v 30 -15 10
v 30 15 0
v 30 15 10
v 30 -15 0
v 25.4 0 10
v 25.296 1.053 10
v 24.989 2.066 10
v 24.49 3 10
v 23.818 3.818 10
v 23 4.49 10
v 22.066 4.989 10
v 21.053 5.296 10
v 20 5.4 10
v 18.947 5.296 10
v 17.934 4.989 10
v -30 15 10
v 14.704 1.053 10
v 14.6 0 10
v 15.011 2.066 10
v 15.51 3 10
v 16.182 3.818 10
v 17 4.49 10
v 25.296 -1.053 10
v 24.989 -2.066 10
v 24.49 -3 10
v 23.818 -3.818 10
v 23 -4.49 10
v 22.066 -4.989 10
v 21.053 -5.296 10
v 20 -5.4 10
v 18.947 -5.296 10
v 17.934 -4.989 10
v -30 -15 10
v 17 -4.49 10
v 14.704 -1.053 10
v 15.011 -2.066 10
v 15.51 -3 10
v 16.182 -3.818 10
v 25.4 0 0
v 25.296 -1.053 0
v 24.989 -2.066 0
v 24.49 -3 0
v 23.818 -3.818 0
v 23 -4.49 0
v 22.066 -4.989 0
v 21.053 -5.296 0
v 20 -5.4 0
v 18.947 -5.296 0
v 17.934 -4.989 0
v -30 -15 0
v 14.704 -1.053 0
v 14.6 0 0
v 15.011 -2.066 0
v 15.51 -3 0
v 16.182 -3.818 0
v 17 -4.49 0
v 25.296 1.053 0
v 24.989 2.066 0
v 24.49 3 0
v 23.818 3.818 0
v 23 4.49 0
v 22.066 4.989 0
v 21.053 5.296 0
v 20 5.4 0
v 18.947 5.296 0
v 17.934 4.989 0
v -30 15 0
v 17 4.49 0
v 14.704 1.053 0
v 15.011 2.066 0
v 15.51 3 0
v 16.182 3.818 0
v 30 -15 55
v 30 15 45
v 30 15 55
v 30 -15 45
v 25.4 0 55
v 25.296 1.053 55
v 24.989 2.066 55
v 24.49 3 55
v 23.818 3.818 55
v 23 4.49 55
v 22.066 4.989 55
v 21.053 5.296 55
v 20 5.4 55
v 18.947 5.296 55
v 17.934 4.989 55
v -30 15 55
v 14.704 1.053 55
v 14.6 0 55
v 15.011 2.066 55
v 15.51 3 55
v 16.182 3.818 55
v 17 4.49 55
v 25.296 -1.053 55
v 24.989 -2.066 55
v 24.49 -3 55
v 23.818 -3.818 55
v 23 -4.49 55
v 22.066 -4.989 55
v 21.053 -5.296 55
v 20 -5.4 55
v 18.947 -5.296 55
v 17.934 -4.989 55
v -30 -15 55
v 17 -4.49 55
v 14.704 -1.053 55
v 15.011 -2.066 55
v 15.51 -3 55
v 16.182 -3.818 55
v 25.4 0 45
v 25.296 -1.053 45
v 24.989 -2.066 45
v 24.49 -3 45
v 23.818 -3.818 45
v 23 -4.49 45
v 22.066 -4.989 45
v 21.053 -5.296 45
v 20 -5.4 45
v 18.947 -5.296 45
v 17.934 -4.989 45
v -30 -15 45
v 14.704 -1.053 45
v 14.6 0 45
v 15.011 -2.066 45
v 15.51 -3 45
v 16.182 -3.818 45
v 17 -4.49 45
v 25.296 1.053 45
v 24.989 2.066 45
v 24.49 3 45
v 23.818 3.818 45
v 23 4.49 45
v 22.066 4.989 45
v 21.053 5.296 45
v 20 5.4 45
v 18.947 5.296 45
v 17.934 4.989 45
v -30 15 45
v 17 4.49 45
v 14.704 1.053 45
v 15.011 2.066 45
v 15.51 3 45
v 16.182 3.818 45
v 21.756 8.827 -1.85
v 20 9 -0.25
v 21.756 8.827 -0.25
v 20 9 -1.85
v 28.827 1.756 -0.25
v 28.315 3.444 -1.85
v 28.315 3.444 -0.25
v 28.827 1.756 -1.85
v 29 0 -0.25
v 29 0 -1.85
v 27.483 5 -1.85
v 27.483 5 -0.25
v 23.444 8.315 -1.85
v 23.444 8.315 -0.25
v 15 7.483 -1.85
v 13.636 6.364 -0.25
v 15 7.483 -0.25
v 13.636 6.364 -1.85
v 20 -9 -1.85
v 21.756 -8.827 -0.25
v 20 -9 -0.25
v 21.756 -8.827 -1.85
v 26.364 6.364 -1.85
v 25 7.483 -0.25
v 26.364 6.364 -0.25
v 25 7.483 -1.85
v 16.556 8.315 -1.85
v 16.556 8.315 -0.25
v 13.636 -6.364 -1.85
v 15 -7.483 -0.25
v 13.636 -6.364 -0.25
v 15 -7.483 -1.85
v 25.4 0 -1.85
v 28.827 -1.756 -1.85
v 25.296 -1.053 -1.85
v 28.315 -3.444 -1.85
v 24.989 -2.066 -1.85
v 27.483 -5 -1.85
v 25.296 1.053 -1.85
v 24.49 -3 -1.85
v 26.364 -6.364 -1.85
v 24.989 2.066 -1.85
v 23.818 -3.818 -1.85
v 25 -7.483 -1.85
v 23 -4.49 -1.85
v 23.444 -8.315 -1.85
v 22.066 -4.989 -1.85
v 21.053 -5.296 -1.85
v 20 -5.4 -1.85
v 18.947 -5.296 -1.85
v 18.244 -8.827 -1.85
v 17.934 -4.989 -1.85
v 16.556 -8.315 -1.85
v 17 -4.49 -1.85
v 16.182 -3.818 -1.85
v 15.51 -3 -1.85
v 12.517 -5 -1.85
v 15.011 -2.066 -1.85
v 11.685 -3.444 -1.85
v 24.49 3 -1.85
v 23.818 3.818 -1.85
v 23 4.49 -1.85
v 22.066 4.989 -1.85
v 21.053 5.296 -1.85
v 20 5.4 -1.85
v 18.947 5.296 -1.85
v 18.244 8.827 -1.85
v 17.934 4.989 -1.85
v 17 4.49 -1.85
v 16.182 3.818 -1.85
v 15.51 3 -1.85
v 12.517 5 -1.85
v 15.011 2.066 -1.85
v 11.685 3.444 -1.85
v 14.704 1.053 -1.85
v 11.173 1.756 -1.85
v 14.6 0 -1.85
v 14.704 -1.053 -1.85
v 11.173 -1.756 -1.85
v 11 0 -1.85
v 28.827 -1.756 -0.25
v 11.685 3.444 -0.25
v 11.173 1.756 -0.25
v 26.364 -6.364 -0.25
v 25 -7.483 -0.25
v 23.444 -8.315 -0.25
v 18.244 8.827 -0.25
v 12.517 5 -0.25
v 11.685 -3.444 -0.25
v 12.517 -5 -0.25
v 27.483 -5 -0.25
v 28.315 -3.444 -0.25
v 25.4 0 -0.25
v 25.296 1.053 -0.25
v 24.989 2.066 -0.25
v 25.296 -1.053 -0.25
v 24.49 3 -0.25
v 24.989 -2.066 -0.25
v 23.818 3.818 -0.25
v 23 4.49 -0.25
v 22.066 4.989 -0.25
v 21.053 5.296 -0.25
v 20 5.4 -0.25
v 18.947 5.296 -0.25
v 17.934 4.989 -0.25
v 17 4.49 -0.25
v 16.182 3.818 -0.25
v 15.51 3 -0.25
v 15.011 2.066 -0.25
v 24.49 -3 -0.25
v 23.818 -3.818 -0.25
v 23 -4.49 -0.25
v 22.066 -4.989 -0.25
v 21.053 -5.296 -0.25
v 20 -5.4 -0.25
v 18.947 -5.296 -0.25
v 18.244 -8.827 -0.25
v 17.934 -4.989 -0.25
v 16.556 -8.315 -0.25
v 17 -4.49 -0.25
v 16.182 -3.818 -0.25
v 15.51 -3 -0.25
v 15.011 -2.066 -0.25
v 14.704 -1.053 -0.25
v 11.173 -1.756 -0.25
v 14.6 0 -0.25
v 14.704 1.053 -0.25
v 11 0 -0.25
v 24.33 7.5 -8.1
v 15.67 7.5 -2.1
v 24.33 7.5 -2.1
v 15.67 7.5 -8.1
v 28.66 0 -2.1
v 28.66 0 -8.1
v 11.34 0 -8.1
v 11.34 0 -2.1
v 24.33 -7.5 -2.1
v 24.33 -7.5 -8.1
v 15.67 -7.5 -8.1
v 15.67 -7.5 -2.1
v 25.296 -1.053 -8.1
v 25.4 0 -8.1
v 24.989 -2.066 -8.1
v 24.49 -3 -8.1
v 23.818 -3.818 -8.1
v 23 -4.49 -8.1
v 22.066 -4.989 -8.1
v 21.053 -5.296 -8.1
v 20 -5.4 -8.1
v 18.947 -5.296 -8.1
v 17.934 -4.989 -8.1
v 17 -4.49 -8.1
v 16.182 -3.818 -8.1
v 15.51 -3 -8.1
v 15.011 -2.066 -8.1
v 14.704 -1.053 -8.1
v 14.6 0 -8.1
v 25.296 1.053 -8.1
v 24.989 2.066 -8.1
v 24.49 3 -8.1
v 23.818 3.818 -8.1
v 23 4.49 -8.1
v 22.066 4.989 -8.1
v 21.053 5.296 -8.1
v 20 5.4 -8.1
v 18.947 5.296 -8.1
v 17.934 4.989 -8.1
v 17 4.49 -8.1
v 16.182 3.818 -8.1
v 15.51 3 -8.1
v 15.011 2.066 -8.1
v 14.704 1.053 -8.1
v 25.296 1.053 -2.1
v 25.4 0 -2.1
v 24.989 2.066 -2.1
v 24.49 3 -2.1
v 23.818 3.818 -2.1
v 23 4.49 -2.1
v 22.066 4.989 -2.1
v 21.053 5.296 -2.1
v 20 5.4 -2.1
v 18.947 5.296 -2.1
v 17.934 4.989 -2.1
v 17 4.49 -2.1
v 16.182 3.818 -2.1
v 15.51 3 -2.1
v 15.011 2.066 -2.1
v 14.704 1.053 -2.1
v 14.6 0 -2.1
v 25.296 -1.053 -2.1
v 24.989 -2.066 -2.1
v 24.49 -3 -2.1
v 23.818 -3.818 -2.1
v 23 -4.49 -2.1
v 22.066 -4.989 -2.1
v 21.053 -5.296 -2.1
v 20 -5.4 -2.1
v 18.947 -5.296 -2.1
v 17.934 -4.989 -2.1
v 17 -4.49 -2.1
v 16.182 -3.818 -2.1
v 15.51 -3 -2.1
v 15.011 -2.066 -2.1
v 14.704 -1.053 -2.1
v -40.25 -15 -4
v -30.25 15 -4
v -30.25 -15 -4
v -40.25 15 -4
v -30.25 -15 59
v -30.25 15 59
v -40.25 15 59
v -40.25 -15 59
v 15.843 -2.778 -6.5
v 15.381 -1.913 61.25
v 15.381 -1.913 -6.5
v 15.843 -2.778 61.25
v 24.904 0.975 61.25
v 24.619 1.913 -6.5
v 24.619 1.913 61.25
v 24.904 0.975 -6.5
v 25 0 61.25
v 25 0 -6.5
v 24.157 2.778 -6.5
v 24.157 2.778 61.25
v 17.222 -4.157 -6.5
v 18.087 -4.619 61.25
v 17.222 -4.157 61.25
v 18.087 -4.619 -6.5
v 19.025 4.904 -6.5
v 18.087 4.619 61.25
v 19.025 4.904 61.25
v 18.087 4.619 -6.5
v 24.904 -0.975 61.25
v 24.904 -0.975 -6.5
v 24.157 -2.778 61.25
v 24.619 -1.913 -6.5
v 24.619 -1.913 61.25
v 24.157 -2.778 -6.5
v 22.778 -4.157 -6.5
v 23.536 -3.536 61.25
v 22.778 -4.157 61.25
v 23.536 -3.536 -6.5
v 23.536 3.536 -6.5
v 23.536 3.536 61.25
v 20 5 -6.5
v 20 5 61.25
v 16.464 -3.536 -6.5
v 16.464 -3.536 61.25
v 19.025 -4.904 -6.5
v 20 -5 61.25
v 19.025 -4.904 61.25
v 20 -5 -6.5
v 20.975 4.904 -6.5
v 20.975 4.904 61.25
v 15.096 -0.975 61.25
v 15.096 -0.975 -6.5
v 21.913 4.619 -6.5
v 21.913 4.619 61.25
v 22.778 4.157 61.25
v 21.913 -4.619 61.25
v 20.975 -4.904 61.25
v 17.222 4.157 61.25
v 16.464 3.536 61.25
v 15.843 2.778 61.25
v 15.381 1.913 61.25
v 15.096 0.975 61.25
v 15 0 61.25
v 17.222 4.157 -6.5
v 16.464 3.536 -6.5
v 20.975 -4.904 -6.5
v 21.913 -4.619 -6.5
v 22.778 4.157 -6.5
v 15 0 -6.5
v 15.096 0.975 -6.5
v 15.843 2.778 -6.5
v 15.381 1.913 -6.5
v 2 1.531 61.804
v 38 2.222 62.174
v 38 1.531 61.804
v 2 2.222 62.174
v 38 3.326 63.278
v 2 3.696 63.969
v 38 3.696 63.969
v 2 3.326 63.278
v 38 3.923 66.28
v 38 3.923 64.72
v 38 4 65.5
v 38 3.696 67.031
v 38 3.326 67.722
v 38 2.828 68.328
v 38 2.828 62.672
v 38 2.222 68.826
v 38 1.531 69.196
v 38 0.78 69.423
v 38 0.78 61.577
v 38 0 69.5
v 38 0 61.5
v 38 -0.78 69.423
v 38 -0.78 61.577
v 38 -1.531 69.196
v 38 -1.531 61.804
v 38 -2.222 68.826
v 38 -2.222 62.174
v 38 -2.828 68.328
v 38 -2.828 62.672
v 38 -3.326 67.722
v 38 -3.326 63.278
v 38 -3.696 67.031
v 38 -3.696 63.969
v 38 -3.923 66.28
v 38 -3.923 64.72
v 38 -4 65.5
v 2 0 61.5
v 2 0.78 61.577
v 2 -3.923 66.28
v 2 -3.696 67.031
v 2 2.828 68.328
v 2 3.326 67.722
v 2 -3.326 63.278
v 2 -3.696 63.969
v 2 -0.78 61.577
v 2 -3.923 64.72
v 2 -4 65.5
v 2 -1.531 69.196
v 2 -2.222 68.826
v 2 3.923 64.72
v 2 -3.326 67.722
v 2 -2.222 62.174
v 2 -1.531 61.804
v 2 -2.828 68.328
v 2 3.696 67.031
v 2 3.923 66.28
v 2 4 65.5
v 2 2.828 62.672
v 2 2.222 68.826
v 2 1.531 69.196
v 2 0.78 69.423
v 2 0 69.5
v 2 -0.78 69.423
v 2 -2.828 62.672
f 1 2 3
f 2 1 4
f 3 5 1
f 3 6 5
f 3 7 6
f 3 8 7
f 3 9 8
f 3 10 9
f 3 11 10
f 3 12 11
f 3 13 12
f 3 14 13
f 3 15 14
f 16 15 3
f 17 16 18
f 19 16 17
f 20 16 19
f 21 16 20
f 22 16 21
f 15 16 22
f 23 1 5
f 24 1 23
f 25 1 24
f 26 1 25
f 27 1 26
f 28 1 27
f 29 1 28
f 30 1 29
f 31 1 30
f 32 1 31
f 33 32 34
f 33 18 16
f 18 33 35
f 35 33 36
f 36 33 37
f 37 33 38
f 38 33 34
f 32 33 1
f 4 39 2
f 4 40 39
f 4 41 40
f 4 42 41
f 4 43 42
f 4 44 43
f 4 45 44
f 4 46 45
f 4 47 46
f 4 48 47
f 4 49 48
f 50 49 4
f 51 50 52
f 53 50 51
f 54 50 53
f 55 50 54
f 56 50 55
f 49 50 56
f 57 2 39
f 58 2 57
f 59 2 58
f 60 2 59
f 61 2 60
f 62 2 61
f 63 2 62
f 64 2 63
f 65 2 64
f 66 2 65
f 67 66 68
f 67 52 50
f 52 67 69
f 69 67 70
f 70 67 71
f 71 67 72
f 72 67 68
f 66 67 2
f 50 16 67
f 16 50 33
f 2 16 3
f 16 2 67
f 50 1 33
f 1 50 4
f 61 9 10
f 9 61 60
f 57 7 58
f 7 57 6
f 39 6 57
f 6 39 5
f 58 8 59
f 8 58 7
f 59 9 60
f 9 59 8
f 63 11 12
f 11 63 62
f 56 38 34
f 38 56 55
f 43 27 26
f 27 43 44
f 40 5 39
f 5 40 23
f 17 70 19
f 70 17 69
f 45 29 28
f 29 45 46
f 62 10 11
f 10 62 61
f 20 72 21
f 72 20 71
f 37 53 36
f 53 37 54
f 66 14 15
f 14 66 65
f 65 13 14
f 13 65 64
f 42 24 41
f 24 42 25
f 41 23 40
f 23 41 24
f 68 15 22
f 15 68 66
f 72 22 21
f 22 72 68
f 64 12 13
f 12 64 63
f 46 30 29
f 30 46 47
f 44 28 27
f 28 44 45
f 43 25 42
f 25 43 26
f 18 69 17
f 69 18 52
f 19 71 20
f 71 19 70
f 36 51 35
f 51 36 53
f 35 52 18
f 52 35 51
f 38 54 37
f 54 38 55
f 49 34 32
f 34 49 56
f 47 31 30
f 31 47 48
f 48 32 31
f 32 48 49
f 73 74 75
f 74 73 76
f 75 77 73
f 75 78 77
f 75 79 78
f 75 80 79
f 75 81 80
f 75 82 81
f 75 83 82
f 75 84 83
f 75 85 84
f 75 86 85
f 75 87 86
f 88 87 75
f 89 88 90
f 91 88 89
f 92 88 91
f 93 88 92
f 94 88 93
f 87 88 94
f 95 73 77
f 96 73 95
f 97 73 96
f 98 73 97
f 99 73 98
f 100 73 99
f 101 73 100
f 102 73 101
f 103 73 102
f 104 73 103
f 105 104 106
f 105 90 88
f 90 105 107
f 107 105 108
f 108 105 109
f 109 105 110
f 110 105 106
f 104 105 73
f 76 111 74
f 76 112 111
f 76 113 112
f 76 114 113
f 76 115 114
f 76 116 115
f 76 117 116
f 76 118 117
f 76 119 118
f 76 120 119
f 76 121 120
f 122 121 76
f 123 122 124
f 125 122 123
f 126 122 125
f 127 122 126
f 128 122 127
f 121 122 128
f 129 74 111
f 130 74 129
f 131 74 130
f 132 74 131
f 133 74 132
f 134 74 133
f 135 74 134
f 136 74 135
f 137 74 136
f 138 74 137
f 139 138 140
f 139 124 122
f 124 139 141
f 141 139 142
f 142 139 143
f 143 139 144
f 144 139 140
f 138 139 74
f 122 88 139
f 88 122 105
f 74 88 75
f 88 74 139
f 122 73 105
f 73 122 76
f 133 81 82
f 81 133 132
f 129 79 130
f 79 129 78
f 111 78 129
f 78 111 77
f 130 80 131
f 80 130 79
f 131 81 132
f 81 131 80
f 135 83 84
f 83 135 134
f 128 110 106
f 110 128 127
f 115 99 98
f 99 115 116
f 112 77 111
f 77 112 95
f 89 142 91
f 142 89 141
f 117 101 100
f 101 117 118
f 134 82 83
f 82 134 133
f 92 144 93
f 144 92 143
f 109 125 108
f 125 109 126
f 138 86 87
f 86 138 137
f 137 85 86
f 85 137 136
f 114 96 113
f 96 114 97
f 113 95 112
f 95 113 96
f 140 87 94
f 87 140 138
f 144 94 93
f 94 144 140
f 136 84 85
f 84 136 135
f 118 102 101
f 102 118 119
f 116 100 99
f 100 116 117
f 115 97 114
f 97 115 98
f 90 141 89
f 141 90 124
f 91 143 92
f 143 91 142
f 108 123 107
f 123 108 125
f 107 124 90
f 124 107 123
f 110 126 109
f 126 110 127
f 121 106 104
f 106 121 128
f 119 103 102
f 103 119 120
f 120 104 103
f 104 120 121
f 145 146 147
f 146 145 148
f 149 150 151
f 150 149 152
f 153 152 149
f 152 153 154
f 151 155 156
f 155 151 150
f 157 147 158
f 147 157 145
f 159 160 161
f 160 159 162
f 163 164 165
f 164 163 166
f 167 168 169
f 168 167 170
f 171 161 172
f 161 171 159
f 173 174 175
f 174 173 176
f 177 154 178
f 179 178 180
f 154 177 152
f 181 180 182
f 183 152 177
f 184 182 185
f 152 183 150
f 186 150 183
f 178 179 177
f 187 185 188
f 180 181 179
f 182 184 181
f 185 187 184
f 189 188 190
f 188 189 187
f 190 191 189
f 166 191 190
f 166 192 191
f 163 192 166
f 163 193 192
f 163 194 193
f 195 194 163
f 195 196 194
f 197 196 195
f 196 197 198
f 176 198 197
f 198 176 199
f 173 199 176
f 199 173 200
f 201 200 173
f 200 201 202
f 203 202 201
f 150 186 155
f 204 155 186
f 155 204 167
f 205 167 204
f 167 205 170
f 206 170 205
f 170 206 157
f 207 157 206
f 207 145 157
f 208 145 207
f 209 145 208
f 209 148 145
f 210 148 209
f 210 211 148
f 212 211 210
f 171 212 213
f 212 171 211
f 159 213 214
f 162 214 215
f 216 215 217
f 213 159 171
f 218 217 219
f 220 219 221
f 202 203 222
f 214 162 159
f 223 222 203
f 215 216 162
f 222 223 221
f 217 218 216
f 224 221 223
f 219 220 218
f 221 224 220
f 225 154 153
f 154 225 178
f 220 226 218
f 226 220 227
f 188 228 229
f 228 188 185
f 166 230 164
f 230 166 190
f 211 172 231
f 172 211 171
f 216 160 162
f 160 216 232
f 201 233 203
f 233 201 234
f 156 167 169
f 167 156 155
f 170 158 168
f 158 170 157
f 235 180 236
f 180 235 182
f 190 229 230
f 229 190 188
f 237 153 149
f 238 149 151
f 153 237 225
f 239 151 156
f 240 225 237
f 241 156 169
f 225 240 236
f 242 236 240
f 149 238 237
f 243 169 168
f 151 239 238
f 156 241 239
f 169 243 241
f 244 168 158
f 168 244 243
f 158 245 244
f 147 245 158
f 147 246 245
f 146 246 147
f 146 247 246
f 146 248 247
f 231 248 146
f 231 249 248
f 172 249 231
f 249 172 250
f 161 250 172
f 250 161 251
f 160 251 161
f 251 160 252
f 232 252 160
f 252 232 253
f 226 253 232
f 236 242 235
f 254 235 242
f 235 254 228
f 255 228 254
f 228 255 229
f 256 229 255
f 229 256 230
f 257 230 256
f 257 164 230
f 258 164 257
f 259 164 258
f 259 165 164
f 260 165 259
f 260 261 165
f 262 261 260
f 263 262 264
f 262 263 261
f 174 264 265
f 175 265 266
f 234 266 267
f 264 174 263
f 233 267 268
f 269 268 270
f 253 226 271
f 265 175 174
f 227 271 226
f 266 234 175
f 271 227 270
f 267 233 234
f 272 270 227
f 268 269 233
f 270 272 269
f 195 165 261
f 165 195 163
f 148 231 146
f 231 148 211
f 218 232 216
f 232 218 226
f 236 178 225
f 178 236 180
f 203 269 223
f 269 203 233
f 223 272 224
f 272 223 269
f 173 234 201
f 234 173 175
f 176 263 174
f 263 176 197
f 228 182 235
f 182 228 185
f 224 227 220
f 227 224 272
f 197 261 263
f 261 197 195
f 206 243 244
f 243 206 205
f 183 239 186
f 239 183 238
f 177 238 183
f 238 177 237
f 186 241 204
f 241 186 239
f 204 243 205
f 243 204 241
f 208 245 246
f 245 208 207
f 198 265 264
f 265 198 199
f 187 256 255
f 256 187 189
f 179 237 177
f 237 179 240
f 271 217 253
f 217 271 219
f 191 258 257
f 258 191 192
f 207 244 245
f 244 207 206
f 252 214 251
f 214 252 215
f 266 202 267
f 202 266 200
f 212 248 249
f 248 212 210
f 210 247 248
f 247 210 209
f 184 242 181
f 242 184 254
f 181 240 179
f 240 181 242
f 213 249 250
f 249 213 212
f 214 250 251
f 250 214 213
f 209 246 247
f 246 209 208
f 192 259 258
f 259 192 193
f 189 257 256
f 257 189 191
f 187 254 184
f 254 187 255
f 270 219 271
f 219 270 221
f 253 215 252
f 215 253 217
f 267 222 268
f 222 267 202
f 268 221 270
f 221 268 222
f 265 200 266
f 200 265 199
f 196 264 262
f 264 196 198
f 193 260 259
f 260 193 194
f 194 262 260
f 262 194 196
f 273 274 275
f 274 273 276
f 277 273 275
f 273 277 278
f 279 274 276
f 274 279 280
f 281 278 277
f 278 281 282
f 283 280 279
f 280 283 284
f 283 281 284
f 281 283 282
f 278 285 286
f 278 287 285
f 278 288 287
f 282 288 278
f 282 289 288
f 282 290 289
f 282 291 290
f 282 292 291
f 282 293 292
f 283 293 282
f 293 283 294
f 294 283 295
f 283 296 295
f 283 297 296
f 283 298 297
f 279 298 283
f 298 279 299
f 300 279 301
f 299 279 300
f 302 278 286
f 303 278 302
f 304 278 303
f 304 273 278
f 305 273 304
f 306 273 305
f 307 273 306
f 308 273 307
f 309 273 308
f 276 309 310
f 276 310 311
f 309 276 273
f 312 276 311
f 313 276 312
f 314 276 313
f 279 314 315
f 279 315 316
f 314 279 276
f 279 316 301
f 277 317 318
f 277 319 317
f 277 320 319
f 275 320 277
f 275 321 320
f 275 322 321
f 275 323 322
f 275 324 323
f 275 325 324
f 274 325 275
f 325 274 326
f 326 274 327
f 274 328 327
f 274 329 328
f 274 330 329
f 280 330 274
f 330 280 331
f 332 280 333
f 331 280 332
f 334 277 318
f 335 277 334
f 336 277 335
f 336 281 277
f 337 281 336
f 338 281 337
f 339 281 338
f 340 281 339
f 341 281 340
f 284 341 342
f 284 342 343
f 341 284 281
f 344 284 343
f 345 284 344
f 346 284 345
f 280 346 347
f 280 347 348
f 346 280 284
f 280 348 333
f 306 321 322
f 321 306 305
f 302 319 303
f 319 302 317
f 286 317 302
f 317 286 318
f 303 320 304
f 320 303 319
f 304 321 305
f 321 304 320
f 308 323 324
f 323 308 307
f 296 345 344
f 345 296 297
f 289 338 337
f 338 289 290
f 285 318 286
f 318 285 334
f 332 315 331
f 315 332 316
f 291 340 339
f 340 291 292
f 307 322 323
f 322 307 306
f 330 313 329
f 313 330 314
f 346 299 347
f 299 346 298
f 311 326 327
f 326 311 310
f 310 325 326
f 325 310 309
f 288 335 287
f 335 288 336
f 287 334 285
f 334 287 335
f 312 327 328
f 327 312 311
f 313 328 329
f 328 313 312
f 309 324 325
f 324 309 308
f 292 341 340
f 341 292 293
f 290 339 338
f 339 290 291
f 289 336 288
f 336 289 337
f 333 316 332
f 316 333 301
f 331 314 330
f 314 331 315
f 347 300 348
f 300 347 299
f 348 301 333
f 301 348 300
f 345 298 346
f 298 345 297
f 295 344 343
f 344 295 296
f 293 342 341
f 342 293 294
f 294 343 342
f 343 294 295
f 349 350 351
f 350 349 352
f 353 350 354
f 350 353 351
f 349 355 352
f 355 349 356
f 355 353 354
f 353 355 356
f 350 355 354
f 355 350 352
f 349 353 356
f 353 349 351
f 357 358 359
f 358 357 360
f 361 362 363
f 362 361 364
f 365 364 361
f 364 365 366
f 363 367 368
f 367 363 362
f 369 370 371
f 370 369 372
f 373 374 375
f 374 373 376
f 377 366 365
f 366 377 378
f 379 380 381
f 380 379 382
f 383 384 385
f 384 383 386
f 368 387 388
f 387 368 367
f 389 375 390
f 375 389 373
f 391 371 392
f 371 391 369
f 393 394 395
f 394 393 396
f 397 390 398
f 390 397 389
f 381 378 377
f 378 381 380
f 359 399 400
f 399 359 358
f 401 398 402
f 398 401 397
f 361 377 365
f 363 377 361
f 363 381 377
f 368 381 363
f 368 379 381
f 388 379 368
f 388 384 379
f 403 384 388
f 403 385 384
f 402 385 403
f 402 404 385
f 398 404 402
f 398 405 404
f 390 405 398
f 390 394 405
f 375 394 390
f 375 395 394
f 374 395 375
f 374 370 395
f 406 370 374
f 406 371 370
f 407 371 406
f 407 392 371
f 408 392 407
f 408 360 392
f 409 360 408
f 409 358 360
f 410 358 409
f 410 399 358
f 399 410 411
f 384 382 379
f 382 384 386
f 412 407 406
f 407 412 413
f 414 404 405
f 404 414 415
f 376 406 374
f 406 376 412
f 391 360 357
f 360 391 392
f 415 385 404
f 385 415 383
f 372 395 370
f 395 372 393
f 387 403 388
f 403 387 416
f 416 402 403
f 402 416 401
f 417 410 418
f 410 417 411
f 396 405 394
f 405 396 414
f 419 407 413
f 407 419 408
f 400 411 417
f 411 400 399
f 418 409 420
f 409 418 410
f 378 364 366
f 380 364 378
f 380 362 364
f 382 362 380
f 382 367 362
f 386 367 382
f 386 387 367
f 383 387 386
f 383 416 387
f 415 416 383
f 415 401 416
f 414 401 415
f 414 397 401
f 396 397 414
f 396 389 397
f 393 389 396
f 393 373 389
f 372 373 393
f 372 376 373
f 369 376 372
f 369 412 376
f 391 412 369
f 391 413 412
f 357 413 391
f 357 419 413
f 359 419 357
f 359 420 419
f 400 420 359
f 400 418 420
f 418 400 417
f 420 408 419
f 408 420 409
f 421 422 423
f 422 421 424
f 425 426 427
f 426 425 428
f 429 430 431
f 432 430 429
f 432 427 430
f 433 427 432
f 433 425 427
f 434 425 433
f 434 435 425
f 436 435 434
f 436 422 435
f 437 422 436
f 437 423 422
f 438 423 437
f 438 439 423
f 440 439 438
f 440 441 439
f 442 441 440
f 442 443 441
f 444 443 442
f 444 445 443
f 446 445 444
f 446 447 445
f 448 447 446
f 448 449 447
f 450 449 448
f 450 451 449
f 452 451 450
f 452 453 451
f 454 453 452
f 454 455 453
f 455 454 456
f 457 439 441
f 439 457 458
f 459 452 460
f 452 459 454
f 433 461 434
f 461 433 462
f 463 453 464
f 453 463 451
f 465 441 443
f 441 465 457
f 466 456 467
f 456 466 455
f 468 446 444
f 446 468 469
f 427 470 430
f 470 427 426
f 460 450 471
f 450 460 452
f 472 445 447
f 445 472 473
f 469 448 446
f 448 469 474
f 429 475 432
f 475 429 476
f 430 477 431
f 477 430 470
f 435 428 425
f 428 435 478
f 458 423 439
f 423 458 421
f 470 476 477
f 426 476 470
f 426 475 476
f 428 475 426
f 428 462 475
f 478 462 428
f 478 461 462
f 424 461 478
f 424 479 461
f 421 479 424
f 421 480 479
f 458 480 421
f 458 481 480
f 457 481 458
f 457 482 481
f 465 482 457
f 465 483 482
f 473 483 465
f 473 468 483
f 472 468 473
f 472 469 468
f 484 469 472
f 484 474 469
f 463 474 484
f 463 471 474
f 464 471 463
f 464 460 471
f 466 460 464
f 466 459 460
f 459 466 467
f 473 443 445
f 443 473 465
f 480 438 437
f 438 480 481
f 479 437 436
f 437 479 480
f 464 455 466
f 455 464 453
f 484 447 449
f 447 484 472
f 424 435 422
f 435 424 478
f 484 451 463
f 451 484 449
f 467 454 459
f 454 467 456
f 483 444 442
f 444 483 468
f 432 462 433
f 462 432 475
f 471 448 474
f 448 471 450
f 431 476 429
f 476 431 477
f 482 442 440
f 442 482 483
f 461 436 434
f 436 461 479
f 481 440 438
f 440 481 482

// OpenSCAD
$fn = 32;

// ------------------------------------------------------------------------
// C clamp: throat 45 mm, screw d10
// Every part is its own module, assembly() places every instance.
// ------------------------------------------------------------------------

// --- part 1 ---
module clamp_arm() {
  difference() {
    translate([-30, -15, 0]) cube([60, 30, 10]);
    translate([20, 0, -1]) cylinder(h = 12, d = 10.8);
  }
}

// --- part 2 ---
module clamp_spine() {
  difference() {
    translate([-31.5, -15, 0]) cube([63, 30, 10]);
  }
}

// --- part 3 ---
module clamp_screw() {
  translate([0, 0, -33.875]) cylinder(h = 67.75, d = 10);
}

// --- part 4 ---
module clamp_washer() {
  difference() {
      translate([0, 0, 0]) cylinder(h = 1.6, d = 18);
      translate([0, 0, -1]) cylinder(h = 3.6, d = 10.8);
    }
}

// --- part 5 ---
module clamp_nut() {
  difference() {
    linear_extrude(height = 6) polygon(points = [[8.66, 0], [4.33, 7.5], [-4.33, 7.5], [-8.66, 0], [-4.33, -7.5], [4.33, -7.5]]);
    translate([0, 0, -1]) cylinder(h = 8, d = 10.8);
  }
}

// --- part 6 ---
module tommy_bar() {
  translate([0, 0, -18]) cylinder(h = 36, d = 8);
}

// --- assembly ---
module assembly() {
  color([0.80, 0.24, 0.20]) translate([0, 0, 0]) rotate([0, 0, 0]) clamp_arm();
  color([0.20, 0.45, 0.75]) translate([0, 0, 45]) rotate([0, 0, 0]) clamp_arm();
  color([0.25, 0.62, 0.32]) translate([-40.25, 0, 27.5]) rotate([0, 90, 0]) clamp_spine();
  color([0.92, 0.70, 0.18]) translate([20, 0, 27.375]) rotate([0, 0, 0]) clamp_screw();
  color([0.58, 0.35, 0.70]) translate([20, 0, -1.85]) rotate([0, 0, 0]) clamp_washer();
  color([0.16, 0.66, 0.66]) translate([20, 0, -8.1]) rotate([0, 0, 0]) clamp_nut();
  color([0.85, 0.48, 0.18]) translate([20, 0, 65.5]) rotate([0, 90, 0]) tommy_bar();
}

assembly();
